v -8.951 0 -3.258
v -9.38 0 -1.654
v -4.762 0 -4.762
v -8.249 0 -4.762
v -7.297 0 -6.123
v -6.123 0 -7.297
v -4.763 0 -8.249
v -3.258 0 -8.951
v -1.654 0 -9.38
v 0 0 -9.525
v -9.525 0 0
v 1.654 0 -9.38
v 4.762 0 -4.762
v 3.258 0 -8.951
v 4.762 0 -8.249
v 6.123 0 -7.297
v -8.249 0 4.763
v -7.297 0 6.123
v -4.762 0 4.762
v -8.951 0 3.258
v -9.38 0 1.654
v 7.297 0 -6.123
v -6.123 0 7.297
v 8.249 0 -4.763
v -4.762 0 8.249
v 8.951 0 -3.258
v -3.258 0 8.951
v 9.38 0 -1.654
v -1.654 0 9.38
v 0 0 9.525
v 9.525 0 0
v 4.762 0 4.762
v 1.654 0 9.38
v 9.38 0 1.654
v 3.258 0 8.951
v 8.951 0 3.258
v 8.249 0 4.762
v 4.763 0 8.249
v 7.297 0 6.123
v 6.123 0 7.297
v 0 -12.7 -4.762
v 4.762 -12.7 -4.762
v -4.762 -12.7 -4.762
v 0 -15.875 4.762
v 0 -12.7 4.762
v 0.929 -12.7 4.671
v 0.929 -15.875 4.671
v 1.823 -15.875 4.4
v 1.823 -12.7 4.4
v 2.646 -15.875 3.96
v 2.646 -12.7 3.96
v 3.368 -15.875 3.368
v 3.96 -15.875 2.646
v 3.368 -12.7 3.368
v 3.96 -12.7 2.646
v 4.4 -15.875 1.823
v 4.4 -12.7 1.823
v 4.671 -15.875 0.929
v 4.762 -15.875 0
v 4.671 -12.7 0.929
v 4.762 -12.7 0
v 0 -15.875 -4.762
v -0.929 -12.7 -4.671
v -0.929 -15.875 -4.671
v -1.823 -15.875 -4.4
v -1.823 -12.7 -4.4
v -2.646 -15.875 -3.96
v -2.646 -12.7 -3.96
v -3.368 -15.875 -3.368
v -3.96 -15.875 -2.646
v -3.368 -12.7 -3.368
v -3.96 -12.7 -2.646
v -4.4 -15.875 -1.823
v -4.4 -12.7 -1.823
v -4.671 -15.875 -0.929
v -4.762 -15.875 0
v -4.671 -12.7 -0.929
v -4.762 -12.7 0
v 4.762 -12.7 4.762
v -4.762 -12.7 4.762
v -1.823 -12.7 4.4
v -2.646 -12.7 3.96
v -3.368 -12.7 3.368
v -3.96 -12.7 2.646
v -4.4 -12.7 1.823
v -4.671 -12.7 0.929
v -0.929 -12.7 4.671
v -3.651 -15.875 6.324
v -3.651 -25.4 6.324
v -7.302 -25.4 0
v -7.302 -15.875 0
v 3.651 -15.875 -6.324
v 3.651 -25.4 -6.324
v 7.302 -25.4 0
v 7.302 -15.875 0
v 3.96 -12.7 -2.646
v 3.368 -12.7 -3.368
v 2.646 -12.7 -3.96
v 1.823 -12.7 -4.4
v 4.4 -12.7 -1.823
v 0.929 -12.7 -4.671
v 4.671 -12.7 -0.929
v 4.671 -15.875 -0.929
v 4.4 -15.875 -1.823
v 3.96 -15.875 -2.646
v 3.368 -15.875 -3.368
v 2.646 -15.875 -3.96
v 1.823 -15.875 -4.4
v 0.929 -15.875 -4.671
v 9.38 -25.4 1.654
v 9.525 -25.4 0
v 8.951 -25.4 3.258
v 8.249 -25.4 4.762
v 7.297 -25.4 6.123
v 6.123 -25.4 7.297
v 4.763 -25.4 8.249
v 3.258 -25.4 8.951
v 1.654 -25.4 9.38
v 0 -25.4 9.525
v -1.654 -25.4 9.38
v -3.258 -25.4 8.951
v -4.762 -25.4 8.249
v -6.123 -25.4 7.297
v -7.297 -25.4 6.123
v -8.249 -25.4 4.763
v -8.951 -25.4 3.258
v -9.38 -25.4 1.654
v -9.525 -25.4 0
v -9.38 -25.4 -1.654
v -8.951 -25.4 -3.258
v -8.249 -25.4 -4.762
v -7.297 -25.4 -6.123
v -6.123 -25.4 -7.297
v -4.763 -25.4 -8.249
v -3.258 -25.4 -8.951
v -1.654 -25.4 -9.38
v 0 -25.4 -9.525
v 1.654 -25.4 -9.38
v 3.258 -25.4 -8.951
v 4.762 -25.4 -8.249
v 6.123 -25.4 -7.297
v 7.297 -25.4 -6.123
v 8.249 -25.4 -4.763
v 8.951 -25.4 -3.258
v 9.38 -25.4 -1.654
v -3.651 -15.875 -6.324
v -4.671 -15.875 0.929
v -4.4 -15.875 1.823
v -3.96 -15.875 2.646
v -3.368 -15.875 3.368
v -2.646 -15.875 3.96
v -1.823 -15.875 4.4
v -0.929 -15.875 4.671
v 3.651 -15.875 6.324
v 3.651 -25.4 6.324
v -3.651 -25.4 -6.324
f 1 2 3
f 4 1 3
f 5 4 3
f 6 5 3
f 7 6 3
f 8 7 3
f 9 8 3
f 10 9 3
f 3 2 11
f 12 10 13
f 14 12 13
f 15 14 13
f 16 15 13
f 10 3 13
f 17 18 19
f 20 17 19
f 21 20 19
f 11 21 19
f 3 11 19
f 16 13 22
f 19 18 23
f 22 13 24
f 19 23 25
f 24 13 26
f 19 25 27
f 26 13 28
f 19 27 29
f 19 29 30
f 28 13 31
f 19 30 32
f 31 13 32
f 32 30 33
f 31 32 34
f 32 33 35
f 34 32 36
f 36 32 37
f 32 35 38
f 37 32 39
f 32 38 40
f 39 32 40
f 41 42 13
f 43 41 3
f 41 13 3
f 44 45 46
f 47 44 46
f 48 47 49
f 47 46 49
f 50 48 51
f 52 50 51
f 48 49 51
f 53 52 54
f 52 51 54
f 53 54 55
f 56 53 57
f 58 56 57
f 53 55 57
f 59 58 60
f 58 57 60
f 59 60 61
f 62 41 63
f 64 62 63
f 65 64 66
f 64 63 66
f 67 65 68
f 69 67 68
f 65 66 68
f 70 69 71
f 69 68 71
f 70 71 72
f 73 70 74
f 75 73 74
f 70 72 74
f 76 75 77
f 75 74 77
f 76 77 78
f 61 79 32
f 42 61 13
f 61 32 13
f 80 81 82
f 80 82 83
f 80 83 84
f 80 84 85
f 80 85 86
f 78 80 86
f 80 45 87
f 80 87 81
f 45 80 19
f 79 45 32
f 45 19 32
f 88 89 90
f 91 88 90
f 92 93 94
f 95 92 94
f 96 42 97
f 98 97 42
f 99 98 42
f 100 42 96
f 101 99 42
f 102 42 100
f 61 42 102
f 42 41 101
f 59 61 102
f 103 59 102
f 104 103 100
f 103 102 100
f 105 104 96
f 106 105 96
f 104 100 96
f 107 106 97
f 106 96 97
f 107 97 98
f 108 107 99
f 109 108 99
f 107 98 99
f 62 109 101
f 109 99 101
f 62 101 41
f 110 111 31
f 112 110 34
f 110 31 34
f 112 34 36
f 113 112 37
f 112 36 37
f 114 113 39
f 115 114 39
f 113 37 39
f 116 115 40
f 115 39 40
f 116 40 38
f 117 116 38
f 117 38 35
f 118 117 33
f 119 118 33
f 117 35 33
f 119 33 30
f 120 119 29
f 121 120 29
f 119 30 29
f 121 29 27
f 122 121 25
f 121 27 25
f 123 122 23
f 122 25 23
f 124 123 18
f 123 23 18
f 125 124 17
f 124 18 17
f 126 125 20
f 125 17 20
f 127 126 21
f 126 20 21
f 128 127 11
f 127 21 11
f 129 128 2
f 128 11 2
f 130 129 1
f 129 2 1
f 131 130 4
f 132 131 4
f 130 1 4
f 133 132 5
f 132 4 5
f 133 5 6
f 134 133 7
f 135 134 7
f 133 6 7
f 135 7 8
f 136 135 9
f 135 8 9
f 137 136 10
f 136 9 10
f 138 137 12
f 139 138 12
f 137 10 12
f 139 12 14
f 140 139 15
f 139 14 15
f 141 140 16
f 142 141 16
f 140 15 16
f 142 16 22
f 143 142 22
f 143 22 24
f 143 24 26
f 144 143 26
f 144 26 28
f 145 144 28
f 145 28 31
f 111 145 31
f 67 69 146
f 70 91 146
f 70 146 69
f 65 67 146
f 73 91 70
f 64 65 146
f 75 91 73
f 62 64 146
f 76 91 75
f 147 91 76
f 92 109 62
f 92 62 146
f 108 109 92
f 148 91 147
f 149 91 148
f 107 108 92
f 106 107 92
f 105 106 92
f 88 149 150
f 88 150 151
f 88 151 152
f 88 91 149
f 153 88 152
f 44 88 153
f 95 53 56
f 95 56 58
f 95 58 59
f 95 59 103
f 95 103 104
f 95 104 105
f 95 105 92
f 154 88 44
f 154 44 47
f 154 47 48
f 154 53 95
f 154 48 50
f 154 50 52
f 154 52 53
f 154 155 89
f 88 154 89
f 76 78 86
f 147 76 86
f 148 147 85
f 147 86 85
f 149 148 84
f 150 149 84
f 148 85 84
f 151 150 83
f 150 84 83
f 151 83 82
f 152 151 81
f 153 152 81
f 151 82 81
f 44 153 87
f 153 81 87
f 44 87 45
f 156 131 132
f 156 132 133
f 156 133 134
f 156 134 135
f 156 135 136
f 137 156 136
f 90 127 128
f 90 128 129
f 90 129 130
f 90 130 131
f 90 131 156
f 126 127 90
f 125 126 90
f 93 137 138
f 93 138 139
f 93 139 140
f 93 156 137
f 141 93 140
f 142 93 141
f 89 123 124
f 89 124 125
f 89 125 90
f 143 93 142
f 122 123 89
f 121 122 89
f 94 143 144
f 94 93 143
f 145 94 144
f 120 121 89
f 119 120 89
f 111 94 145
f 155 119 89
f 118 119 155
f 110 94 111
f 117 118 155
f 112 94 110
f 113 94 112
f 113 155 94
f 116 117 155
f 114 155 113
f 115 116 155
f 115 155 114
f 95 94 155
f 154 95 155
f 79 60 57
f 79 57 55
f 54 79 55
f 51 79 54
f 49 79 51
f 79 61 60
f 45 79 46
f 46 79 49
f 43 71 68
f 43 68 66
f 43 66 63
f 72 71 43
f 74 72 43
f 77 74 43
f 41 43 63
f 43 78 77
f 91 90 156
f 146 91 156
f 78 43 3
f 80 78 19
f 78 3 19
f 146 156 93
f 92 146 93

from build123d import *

# Parameters (mm, degrees)
F0_R     = 9.525
F1_DEPTH = 25.4
F3_DEPTH = 25.401
F4_DEPTH = 12.7
F6_DEPTH = 9.525


with BuildPart() as f1:
    # F0 (on Front) → F1 (new body)
    with BuildSketch(Plane.XZ):
        Circle(F0_R)
    extrude(amount=F1_DEPTH)

    # F2 (on face) → F3 (cut, through all)
    with BuildSketch(Plane(origin=(0, 0, 0), x_dir=(-1, 0, 0), z_dir=(0, 1, 0))):
        with BuildLine():
            ThreePointArc((-4.7625, 0), (-3.367596, -3.367596), (0, -4.7625))
            ThreePointArc((0, -4.7625), (3.367596, -3.367596), (4.7625, 0))
            ThreePointArc((4.7625, 0), (3.367596, 3.367596), (0, 4.7625))
            ThreePointArc((0, 4.7625), (-3.367596, 3.367596), (-4.7625, 0))
        make_face()
    extrude(amount=-F3_DEPTH, mode=Mode.SUBTRACT)

    # F2 (on face) → F4 (cut)
    with BuildSketch(Plane(origin=(0, 0, 0), x_dir=(-1, 0, 0), z_dir=(0, 1, 0))):
        with BuildLine():
            Line((-4.7625, 0), (-4.7625, -4.7625))
            Line((-4.7625, -4.7625), (0, -4.7625))
            ThreePointArc((0, -4.7625), (-3.367596, -3.367596), (-4.7625, 0))
        make_face()
        with BuildLine():
            ThreePointArc((4.7625, 0), (3.367596, -3.367596), (0, -4.7625))
            Line((0, -4.7625), (4.7625, -4.7625))
            Line((4.7625, -4.7625), (4.7625, 0))
        make_face()
        with BuildLine():
            Line((-4.7625, 4.7625), (-4.7625, 0))
            ThreePointArc((-4.7625, 0), (-3.367596, 3.367596), (0, 4.7625))
            Line((0, 4.7625), (-4.7625, 4.7625))
        make_face()
        with BuildLine():
            ThreePointArc((0, 4.7625), (3.367596, 3.367596), (4.7625, 0))
            Line((4.7625, 0), (4.7625, 4.7625))
            Line((4.7625, 4.7625), (0, 4.7625))
        make_face()
    extrude(amount=-F4_DEPTH, mode=Mode.SUBTRACT)

    # F5 (on face) → F6 (cut)
    with BuildSketch(Plane.XZ.offset(25.4)):
        Polygon((3.65125, 6.324151), (-3.65125, 6.324151), (-7.3025, 0), (-3.65125, -6.324151), (3.65125, -6.324151), (7.3025, 0), align=None)
    extrude(amount=-F6_DEPTH, mode=Mode.SUBTRACT)


solid = f1.part
